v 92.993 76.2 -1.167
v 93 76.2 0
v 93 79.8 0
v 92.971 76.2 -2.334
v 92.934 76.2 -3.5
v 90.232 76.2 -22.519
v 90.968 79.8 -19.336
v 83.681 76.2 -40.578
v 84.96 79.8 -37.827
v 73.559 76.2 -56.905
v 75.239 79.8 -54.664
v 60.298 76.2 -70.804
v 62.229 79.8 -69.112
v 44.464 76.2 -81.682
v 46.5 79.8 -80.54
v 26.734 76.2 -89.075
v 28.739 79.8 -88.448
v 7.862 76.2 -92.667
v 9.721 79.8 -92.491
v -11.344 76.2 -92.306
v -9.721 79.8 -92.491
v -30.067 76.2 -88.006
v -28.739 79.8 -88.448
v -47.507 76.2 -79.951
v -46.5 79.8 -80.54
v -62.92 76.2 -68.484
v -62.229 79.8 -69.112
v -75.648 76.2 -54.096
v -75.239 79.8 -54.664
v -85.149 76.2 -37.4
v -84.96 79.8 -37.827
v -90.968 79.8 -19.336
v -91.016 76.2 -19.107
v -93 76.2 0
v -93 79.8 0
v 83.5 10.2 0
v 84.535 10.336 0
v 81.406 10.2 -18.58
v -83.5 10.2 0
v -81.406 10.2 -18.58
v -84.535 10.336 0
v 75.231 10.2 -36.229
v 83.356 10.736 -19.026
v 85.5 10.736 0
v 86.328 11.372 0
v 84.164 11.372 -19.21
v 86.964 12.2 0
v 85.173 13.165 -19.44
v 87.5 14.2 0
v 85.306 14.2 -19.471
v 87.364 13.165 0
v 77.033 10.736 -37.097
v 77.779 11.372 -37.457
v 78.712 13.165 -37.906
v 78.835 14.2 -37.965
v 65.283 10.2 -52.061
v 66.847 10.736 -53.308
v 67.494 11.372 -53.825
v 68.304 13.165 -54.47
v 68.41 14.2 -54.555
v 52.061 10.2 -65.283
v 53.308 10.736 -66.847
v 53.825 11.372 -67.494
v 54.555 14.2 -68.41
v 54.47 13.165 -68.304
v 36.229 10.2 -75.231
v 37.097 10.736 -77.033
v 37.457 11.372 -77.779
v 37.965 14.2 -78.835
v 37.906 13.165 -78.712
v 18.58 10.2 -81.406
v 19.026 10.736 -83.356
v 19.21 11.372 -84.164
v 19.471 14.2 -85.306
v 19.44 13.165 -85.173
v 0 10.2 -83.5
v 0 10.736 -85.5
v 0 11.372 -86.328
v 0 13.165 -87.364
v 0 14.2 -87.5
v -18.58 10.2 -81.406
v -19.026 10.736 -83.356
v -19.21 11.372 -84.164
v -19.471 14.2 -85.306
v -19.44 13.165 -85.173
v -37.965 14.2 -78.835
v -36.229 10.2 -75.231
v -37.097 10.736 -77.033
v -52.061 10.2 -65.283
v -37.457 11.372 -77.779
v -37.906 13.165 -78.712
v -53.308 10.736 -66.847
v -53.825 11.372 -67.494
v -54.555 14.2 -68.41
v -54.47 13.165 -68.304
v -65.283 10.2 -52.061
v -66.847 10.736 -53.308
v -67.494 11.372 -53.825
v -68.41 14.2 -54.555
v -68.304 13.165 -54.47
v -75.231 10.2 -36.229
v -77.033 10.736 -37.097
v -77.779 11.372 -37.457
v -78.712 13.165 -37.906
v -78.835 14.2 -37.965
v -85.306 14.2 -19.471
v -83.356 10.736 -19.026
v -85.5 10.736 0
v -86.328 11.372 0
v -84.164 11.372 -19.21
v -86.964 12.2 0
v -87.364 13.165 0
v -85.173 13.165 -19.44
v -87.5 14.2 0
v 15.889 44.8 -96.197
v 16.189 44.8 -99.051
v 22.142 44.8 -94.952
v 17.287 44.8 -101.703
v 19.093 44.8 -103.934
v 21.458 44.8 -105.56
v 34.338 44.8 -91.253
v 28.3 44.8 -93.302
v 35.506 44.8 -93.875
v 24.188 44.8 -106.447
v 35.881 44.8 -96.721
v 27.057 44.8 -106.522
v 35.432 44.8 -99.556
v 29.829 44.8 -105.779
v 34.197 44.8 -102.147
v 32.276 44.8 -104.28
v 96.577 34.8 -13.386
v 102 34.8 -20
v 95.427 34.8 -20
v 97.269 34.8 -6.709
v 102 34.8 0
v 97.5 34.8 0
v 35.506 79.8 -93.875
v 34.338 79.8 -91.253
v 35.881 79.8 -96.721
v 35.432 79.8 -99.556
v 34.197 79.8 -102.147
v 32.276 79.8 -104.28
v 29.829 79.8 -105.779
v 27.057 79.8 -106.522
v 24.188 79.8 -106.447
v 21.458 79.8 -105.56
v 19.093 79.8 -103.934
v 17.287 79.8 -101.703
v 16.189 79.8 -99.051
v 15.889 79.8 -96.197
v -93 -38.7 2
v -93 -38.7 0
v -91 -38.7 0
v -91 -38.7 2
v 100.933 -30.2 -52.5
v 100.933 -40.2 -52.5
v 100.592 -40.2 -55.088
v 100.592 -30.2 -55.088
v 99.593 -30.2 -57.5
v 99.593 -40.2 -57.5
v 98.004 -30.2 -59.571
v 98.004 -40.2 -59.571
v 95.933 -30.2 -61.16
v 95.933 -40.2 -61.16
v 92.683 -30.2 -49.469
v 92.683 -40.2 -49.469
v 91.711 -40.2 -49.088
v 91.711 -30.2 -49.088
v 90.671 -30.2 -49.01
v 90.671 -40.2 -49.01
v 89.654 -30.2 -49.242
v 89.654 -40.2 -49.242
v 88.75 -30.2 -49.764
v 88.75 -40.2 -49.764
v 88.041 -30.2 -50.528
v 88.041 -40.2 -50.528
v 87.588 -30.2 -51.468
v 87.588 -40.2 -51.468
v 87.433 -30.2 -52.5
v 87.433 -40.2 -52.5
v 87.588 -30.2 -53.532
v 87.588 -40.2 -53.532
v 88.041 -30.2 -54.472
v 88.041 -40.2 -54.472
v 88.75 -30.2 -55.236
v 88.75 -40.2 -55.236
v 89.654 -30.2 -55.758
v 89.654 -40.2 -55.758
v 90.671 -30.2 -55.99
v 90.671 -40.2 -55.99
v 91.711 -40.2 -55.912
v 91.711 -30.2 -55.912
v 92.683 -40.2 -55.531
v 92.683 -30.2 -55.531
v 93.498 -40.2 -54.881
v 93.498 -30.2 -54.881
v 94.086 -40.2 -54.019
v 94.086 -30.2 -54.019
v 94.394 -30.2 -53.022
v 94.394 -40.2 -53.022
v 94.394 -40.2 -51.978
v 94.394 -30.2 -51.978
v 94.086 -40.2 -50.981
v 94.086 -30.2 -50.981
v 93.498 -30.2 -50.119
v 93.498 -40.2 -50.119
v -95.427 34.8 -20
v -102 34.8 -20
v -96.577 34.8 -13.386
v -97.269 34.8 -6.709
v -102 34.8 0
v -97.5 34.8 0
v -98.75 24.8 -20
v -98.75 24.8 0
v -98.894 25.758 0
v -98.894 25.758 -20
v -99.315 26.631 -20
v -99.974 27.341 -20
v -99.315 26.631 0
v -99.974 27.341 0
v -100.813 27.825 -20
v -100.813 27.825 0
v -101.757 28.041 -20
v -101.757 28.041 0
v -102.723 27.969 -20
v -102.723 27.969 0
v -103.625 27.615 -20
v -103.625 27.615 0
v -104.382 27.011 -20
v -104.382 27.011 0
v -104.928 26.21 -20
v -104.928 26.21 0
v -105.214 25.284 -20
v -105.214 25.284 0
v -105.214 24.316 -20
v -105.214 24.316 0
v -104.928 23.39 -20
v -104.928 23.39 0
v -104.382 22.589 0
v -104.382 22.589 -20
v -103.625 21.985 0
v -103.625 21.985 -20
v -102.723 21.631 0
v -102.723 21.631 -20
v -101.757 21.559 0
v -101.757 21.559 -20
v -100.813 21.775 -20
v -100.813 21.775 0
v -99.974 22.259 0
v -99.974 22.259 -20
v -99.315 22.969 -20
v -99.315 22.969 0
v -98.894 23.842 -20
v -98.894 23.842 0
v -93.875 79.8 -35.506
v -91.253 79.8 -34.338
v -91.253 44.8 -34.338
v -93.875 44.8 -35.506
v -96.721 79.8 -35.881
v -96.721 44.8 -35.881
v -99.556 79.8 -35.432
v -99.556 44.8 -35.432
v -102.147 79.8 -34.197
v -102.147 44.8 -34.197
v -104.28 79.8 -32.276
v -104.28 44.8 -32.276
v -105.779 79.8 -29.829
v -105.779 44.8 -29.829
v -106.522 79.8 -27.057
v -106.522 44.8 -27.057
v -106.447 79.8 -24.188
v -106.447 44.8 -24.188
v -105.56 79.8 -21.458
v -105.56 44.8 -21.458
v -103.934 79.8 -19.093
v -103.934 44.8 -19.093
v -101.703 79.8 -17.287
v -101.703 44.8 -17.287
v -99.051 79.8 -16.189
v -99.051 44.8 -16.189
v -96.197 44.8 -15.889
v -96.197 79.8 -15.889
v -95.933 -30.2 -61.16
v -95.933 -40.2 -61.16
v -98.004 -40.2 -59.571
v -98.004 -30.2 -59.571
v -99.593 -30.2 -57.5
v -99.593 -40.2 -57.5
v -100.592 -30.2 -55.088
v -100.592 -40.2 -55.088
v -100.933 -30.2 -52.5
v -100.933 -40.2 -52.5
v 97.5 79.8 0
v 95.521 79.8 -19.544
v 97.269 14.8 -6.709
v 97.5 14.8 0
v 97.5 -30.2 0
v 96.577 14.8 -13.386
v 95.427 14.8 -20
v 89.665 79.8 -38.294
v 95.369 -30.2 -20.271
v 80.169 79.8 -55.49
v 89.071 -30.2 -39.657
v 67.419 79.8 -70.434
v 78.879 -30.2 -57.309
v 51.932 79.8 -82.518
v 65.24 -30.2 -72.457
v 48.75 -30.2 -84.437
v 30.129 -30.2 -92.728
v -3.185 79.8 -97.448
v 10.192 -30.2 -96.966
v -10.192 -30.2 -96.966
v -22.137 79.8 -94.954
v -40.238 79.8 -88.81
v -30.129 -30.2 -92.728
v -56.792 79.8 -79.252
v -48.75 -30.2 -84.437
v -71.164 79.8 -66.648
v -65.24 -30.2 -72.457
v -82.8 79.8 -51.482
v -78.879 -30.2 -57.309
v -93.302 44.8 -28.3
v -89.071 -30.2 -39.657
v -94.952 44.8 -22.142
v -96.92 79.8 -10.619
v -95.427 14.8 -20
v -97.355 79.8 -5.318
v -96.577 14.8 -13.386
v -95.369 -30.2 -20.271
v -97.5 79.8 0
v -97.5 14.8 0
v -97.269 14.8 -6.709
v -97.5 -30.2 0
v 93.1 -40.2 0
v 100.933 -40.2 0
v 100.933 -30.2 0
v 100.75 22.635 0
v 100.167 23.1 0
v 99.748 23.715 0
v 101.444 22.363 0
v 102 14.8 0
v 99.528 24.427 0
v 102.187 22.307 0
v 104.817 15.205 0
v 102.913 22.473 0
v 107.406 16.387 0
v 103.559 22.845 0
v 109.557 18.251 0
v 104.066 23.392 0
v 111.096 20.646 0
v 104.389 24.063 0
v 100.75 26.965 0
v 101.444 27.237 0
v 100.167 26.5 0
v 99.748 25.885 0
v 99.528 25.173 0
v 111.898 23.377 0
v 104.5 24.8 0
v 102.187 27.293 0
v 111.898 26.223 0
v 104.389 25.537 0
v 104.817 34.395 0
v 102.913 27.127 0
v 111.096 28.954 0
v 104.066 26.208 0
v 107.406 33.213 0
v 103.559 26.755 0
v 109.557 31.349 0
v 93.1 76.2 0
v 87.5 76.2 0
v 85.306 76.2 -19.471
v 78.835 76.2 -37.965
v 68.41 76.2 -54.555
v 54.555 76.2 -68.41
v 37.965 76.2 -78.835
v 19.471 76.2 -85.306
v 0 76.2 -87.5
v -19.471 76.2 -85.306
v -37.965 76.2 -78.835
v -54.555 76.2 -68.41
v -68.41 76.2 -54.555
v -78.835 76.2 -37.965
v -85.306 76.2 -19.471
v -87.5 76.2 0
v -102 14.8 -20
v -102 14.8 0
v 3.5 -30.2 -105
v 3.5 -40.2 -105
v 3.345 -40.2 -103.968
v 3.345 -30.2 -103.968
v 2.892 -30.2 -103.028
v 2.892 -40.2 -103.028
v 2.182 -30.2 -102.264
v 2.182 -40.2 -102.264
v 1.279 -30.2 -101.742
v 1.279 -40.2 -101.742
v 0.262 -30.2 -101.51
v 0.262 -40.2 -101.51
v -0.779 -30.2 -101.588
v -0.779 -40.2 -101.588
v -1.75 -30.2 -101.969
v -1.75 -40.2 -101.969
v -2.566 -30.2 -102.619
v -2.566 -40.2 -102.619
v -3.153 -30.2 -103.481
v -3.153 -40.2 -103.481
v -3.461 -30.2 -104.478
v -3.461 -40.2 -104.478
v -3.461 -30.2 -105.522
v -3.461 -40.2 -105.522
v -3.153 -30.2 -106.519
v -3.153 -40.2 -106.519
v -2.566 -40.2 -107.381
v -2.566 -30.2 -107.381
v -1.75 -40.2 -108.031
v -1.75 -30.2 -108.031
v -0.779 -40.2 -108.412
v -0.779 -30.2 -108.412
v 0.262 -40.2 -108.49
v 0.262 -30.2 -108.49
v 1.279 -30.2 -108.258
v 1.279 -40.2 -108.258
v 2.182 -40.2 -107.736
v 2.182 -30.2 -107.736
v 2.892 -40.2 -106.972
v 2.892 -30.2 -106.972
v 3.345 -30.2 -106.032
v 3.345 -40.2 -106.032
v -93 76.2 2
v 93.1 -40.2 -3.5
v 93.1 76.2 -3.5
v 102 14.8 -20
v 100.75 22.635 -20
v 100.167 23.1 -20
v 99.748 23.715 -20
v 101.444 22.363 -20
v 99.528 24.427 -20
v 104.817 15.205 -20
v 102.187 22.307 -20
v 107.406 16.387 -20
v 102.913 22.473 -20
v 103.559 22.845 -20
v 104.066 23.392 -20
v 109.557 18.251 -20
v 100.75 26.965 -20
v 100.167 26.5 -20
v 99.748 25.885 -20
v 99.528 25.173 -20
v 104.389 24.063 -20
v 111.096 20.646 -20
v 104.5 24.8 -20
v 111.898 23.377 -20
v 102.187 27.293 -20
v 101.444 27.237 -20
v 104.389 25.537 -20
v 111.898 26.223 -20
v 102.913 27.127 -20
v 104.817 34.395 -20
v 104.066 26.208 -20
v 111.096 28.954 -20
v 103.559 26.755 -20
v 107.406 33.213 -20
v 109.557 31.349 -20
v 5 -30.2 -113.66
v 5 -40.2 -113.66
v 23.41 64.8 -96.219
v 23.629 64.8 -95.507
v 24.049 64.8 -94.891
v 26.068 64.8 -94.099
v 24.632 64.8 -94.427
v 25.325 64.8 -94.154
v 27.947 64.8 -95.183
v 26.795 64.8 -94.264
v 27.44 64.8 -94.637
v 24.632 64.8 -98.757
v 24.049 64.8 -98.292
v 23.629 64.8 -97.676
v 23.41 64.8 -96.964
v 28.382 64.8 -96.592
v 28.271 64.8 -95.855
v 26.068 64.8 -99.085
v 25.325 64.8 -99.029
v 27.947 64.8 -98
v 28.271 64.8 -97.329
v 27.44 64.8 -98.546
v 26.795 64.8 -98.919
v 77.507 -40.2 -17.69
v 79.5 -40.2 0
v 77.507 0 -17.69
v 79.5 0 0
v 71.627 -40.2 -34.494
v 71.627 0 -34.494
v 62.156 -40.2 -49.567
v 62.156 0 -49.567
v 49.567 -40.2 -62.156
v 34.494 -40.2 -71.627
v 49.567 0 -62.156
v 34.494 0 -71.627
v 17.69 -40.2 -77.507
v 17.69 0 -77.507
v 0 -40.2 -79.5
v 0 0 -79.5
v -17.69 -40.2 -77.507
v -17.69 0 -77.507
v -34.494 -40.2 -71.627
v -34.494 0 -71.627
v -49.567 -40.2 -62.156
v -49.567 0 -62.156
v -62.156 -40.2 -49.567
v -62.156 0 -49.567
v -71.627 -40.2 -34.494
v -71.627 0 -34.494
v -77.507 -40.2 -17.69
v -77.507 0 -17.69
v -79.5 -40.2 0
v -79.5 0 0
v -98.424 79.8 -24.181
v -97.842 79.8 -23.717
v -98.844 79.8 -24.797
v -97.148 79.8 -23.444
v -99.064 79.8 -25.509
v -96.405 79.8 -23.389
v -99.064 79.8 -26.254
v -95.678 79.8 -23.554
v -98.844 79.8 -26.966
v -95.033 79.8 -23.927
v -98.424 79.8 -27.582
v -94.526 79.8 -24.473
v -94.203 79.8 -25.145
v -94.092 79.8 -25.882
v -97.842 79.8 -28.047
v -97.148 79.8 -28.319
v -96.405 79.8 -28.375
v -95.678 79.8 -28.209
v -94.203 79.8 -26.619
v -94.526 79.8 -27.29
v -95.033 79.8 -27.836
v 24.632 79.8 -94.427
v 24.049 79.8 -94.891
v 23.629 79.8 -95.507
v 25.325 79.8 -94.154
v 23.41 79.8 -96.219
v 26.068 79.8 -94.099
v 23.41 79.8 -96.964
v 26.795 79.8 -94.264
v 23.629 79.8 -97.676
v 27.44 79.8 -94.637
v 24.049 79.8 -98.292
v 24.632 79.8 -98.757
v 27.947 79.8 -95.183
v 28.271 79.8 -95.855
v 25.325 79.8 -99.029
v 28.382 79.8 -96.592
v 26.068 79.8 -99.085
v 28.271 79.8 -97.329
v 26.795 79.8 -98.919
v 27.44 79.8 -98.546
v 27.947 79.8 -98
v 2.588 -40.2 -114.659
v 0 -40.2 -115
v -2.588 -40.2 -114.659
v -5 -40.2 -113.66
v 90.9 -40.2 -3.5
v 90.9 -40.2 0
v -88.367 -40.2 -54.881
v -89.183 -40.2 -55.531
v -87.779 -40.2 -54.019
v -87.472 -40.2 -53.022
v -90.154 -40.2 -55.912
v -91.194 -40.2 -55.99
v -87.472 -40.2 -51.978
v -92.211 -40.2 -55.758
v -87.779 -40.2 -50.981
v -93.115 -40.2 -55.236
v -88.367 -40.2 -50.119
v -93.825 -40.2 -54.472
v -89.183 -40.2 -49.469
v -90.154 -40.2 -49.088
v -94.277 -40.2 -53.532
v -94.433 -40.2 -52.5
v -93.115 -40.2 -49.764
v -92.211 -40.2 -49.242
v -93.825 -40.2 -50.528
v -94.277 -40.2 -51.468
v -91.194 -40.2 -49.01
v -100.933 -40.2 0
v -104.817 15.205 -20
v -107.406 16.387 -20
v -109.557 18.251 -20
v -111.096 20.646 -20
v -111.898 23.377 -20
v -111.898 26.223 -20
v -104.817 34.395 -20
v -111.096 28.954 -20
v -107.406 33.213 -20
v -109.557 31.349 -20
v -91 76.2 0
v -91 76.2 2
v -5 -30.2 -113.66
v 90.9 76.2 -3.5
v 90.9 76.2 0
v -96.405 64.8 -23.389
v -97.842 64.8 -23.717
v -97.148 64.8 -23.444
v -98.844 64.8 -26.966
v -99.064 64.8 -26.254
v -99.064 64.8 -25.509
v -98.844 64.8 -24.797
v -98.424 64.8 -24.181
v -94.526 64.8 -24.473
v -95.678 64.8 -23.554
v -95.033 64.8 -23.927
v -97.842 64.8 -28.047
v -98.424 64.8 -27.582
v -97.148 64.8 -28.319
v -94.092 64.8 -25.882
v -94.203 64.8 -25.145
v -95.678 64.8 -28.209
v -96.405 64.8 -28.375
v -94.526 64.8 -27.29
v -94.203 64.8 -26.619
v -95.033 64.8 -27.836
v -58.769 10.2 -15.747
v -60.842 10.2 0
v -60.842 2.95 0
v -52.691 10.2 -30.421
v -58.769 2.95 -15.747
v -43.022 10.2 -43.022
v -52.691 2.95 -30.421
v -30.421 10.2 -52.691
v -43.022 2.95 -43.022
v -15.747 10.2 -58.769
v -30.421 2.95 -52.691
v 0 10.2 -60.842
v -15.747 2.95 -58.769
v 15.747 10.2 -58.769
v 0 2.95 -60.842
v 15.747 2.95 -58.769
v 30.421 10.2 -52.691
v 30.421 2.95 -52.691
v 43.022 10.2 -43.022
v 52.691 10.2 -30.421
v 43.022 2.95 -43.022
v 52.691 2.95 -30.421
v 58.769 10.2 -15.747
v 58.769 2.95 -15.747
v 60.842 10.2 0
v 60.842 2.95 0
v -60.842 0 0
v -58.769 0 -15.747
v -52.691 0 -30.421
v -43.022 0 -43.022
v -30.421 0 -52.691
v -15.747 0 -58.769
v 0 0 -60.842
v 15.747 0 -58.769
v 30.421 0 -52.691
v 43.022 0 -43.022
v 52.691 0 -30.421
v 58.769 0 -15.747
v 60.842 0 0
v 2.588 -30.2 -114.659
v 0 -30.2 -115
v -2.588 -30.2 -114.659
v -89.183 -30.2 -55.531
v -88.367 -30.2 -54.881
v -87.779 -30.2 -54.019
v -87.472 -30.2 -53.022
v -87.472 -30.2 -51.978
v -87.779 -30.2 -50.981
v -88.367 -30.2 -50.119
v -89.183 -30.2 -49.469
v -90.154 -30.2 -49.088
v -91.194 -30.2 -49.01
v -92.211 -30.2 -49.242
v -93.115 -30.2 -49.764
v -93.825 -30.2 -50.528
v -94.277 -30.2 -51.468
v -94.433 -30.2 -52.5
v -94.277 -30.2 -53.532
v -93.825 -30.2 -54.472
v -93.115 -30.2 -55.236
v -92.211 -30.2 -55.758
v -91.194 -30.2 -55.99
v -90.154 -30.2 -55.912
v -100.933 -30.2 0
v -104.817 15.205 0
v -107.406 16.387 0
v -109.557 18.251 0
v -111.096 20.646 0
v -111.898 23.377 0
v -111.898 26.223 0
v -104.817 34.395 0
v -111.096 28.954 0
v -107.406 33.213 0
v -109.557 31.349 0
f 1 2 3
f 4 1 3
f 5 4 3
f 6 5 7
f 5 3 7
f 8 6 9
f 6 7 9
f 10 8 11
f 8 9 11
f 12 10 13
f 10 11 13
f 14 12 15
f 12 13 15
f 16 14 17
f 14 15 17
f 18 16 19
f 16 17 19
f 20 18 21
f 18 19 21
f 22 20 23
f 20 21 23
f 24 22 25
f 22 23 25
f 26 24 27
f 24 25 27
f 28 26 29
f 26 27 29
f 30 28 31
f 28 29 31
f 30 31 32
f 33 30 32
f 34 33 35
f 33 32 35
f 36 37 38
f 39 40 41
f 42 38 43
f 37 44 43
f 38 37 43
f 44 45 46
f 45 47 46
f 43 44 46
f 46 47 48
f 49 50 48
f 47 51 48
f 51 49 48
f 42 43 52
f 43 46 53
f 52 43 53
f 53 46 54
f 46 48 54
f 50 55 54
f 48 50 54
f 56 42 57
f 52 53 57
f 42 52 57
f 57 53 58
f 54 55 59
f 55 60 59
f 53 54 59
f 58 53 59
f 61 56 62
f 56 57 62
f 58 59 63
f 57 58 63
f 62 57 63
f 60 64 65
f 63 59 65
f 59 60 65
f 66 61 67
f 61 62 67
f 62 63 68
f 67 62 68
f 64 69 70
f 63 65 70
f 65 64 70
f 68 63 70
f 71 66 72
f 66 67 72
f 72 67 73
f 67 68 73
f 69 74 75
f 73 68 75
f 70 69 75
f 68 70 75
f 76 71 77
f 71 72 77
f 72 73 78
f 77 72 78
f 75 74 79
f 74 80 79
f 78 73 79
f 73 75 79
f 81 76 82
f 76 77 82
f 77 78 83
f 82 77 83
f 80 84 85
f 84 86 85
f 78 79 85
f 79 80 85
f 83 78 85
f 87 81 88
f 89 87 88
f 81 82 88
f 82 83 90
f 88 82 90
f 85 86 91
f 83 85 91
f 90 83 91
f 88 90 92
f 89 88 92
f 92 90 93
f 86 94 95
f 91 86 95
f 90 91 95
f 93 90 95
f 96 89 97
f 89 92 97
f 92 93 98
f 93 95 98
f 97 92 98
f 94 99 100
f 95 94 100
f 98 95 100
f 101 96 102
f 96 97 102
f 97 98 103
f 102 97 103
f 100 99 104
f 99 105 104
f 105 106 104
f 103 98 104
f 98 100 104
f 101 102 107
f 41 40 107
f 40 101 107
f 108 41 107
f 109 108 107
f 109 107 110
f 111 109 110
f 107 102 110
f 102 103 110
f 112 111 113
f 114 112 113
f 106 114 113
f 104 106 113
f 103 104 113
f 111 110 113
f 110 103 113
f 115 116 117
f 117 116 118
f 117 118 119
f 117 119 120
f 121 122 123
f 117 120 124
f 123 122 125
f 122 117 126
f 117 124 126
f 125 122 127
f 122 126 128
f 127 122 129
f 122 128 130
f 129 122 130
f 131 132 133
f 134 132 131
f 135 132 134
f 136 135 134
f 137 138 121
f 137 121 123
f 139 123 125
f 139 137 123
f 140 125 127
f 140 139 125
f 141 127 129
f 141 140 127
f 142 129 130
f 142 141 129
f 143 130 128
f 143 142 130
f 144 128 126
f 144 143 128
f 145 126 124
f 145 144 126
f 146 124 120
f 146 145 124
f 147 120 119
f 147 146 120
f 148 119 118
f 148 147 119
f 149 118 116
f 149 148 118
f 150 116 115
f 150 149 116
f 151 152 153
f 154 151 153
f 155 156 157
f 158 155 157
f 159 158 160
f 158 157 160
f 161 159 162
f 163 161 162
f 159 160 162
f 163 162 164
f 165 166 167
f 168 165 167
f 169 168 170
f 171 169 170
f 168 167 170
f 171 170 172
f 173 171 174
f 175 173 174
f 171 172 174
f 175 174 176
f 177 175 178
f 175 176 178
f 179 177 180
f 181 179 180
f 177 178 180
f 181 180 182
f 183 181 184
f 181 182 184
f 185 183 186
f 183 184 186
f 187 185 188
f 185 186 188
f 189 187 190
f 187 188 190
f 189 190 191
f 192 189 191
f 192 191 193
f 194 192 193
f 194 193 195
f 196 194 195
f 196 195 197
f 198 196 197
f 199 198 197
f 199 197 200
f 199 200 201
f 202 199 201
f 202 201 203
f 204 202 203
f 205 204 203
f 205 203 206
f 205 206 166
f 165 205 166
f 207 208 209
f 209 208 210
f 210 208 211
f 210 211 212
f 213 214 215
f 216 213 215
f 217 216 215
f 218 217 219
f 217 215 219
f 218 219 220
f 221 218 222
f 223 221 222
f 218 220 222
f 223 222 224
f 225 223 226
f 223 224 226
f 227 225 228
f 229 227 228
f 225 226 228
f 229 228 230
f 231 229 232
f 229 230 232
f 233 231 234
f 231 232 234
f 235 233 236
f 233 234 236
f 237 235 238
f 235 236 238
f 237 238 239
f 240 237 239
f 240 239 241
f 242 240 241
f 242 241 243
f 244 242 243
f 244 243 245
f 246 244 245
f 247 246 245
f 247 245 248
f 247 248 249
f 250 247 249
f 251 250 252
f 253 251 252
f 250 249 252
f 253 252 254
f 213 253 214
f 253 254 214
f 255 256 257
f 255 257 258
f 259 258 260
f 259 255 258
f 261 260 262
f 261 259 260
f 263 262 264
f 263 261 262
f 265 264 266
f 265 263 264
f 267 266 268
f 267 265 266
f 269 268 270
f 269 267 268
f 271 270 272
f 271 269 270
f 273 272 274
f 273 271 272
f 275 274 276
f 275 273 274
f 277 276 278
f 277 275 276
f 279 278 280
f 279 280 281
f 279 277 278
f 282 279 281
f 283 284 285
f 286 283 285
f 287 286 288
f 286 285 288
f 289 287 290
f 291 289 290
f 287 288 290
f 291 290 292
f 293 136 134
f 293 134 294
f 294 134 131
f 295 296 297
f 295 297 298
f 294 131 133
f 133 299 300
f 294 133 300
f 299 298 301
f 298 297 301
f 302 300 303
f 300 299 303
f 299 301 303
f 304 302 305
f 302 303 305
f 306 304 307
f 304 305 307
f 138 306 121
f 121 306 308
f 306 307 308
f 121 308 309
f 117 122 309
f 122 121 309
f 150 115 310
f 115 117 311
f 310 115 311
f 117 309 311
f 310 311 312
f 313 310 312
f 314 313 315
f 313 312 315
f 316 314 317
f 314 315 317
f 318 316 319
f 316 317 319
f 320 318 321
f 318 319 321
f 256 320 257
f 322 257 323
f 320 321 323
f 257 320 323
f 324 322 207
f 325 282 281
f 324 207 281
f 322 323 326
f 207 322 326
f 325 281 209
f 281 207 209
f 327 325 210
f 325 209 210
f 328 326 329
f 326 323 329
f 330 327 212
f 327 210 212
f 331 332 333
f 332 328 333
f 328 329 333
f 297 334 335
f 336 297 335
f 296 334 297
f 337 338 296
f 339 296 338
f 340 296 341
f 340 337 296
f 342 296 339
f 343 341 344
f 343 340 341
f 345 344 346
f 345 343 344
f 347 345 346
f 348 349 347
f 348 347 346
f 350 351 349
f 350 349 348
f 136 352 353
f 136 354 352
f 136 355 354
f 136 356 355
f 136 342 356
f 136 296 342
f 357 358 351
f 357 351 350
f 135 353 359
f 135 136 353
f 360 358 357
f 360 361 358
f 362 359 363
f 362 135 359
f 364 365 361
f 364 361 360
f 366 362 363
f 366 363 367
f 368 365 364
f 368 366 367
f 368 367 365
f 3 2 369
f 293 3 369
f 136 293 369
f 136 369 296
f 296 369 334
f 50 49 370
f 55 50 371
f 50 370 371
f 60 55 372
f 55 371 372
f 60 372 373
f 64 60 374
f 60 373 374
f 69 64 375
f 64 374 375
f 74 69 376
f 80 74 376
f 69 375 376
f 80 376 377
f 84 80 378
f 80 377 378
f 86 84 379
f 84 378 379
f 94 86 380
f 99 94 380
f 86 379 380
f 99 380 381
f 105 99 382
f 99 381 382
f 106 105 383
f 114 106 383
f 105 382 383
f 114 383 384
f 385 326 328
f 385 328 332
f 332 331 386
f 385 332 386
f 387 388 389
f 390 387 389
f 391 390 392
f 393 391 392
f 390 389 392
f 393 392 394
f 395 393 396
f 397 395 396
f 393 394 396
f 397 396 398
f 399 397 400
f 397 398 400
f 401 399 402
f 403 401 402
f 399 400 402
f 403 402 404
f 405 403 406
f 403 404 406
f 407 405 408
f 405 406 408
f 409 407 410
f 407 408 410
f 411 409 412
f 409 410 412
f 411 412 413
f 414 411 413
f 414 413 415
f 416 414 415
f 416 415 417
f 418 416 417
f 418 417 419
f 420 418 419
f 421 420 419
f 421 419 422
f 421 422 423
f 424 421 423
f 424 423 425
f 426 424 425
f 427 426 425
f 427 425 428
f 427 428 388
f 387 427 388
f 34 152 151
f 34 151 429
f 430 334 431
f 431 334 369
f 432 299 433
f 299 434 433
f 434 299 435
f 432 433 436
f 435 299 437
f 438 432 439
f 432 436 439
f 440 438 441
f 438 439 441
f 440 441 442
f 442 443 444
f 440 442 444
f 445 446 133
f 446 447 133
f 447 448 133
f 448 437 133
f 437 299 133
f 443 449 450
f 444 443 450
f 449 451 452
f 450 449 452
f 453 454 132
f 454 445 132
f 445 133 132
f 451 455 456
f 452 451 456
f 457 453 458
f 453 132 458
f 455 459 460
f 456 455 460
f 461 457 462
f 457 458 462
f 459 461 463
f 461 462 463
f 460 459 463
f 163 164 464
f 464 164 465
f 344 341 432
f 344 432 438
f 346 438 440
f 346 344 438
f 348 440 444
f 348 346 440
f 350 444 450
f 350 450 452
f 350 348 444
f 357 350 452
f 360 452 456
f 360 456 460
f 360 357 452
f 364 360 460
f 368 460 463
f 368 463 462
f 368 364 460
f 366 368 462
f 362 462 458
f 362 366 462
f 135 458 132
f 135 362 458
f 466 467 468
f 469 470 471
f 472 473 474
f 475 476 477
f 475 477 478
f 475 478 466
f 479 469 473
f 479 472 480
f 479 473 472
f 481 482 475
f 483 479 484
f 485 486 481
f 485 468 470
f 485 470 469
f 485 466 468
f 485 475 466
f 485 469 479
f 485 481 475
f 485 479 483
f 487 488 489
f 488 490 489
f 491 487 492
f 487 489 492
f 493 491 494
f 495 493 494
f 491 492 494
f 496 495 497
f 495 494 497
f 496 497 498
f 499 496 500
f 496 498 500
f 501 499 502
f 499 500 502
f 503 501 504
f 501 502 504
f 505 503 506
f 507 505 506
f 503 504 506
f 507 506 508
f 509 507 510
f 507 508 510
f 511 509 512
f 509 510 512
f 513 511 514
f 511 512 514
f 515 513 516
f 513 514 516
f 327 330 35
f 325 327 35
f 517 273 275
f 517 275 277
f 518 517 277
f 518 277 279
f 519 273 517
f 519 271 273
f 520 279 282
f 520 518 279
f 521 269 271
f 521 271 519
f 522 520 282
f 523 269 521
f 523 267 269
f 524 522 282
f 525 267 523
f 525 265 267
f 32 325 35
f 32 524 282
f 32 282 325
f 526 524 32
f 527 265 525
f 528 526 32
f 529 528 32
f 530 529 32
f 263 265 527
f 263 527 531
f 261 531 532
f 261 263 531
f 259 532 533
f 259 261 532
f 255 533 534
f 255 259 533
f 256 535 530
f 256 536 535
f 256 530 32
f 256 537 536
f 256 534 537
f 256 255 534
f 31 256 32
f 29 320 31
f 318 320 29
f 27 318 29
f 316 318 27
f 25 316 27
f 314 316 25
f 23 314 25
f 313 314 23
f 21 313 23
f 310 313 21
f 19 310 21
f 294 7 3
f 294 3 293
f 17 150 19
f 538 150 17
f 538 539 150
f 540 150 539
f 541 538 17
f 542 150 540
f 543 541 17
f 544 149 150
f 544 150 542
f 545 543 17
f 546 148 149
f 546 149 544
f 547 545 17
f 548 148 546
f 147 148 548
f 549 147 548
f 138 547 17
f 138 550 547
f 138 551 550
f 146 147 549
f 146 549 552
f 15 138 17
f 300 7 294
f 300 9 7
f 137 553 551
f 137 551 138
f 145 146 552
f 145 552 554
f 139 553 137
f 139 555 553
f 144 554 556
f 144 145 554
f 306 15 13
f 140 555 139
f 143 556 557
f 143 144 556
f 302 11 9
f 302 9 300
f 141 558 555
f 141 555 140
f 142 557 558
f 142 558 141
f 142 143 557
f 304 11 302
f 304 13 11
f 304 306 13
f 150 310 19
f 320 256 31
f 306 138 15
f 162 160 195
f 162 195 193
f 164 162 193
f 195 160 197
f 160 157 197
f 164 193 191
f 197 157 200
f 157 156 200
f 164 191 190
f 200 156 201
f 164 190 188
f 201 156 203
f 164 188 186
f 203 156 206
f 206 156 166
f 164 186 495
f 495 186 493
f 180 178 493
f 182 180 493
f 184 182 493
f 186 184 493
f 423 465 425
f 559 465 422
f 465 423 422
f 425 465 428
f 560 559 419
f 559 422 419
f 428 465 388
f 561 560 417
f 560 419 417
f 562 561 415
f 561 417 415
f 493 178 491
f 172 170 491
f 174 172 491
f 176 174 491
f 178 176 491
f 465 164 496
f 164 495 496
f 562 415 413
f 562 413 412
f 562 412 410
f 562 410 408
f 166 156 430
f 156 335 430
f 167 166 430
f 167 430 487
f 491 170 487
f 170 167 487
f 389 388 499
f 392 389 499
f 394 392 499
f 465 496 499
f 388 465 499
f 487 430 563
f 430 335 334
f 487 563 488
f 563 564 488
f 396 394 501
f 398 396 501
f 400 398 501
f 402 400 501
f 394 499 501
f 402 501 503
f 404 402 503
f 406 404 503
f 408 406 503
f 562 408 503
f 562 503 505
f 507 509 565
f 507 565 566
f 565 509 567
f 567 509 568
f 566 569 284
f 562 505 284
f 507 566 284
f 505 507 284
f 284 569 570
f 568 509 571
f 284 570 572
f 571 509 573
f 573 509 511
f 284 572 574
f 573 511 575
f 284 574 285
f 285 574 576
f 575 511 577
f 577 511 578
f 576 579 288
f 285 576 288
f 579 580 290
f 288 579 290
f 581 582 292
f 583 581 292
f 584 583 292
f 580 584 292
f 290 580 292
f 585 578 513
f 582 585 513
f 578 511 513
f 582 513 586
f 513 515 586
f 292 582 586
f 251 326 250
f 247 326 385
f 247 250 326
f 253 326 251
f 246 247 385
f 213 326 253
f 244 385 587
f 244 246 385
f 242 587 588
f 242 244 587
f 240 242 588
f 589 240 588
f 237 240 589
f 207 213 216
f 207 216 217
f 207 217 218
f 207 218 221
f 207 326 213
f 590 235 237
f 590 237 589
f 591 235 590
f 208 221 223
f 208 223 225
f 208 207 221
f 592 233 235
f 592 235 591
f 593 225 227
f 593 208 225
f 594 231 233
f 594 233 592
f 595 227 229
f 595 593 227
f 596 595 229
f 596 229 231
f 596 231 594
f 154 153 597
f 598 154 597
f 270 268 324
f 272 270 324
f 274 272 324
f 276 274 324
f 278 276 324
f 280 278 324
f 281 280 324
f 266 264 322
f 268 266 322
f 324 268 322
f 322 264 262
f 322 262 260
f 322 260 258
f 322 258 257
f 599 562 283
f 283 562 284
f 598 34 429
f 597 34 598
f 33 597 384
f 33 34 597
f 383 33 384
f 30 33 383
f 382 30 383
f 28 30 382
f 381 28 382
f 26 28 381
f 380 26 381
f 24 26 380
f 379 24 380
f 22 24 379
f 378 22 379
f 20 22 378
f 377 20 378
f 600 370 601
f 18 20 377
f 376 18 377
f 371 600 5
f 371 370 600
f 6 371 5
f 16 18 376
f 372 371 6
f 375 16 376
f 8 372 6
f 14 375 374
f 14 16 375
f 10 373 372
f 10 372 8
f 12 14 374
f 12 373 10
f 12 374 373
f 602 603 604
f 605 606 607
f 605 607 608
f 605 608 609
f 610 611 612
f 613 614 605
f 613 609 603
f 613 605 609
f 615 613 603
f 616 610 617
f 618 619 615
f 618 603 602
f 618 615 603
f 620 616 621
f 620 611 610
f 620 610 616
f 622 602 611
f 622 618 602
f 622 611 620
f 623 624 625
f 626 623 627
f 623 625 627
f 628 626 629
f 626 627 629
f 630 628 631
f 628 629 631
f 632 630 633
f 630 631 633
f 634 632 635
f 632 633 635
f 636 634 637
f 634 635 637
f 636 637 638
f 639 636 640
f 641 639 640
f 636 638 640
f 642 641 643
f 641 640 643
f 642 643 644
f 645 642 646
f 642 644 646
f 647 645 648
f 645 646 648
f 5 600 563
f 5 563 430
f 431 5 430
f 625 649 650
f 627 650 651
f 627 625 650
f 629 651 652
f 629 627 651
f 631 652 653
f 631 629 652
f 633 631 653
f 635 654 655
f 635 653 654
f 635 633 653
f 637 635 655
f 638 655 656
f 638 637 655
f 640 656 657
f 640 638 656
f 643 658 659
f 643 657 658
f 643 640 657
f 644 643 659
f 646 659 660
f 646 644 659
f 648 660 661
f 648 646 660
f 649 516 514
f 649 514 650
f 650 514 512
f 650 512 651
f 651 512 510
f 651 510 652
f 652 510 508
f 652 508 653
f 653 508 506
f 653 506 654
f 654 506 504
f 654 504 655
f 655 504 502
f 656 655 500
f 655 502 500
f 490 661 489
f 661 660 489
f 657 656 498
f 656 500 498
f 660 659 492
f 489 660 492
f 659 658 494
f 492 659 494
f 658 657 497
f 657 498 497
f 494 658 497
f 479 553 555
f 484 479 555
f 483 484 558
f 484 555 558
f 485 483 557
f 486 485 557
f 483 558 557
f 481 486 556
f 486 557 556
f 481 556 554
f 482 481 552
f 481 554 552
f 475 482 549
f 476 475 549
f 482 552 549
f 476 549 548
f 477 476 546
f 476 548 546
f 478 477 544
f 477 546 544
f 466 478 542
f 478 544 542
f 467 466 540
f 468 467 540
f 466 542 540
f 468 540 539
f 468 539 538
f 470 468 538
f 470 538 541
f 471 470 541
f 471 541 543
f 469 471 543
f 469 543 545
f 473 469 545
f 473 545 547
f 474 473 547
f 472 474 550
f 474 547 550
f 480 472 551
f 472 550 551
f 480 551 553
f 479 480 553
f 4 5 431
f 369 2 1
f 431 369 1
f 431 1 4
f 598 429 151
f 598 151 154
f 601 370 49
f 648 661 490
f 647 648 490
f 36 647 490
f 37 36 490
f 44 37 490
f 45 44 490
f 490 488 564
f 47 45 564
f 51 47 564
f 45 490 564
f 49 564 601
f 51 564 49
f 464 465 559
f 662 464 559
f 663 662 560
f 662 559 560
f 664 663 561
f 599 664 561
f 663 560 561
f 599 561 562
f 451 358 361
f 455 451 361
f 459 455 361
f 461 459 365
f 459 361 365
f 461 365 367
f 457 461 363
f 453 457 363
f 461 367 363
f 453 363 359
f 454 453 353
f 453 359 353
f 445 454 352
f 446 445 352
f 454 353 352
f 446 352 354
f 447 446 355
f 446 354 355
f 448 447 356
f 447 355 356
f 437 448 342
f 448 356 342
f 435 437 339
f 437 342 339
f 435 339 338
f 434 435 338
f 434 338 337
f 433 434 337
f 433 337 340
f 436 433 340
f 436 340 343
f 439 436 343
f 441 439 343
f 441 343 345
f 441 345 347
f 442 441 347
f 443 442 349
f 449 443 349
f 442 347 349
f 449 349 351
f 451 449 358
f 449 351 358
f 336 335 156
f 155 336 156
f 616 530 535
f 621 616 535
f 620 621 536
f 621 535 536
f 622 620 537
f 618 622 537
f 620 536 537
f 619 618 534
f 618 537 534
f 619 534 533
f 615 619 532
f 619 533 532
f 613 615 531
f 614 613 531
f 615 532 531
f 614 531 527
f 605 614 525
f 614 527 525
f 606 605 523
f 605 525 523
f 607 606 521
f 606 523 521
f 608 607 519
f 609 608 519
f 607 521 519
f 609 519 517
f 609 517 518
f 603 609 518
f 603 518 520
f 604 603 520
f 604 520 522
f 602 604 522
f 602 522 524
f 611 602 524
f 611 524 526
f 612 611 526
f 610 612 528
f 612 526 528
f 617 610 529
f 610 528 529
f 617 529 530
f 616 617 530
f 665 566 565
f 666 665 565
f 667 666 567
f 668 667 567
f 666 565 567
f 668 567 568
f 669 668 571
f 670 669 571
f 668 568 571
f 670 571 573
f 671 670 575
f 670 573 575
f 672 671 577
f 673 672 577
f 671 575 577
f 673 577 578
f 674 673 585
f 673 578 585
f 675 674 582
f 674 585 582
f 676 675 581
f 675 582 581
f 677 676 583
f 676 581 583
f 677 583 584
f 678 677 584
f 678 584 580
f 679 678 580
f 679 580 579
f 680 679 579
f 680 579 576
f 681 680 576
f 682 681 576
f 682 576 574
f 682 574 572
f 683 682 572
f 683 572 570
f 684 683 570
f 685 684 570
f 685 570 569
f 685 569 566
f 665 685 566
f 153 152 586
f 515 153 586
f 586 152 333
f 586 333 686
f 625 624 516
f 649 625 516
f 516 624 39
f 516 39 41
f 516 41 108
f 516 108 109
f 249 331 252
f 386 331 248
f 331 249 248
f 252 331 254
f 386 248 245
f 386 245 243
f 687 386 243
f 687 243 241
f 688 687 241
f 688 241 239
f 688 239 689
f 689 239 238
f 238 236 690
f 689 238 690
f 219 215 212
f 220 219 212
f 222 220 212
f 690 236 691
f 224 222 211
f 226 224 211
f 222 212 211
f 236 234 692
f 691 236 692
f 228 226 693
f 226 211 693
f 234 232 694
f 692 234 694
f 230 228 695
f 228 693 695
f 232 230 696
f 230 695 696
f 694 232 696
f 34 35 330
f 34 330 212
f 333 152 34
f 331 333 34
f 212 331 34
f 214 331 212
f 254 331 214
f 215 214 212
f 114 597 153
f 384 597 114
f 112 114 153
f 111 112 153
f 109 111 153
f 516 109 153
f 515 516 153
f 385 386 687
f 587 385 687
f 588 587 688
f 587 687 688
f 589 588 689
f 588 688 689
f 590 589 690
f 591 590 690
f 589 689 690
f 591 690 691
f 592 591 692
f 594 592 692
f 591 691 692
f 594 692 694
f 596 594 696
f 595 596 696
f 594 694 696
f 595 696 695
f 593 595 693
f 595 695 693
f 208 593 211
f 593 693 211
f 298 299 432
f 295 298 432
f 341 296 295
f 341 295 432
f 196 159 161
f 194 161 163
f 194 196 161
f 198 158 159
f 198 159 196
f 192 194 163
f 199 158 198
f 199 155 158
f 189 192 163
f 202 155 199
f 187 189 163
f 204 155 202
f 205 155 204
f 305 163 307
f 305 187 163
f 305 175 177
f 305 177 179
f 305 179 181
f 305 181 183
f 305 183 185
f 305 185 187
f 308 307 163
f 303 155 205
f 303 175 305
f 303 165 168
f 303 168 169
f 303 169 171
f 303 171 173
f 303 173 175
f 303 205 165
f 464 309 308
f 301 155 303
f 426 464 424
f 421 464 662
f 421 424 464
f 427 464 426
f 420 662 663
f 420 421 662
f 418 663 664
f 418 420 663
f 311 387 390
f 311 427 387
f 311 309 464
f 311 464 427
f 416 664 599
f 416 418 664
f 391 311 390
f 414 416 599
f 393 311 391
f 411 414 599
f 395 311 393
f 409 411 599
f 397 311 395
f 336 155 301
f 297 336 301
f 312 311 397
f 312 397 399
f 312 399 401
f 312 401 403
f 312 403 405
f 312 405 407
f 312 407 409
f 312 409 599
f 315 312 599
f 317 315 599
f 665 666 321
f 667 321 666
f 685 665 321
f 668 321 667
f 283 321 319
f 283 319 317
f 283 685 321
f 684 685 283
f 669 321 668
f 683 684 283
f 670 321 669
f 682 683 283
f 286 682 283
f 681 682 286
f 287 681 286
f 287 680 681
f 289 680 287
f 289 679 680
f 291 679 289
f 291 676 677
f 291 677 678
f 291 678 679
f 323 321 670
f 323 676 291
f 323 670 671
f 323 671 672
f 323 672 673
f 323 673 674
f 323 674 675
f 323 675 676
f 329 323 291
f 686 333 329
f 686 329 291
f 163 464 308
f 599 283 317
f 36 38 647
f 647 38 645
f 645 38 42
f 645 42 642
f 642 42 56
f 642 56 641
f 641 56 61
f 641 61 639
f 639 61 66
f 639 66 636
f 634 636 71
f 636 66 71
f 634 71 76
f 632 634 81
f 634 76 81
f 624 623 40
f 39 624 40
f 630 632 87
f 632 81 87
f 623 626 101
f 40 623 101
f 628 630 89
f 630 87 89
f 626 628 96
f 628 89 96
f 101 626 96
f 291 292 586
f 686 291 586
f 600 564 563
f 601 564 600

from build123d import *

# Parameters (mm, degrees)
REVOLU_O2_ANGLE             = 180
ESBO_O4_R                   = 10
RESSALTO_EXTRUS_O1_DEPTH    = 35
RESSALTO_EXTRUS_O10_DEPTH   = 10
ESBO_O8_R                   = 3.5
CORTE_EXTRUS_O2_DEPTH       = 20
PADR_OCIRCULAR1_COUNT       = 6
ESBO_O6_R                   = 2.5
CORTE_EXTRUS_O1_DEPTH       = 15
ESBO_O9_R                   = 1.25
CORTE_EXTRUS_O3_DEPTH       = 6
ESBO_O10_W                  = 2.2
ESBO_O10_H                  = 116.4
CORTE_EXTRUS_O4_DEPTH       = 3.5
ESBO_O11_W                  = 2
ESBO_O11_H                  = 114.9
RESSALTO_EXTRUS_O5_DEPTH    = 2
ESBO_O12_R                  = 3.25
RESSALTO_EXTRUS_O6_DEPTH    = 20
ESBO_O13_R                  = 2.5
RESSALTO_EXTRUS_O7_DEPTH    = 20
ESBO_O16_R                  = 93
CORTE_EXTRUS_O6_DEPTH       = 10
ESBO_O25_R                  = 60.842408243
CORTE_EXTRUS_O10_DEPTH      = 44.15
CORTE_EXTRUS_O10_DEPTH_BACK = 77.85


with BuildPart() as part:
    # Esbo_o3 → Revolu_o2 (revolve)
    with BuildSketch(Plane.XY):
        with BuildLine():
            Line((97.5, 79.8), (97.5, 11.304491341))
            Line((97.5, 11.304491341), (97.5, 0))
            Line((97.5, 0), (97.5, -40.2))
            Line((97.5, -40.2), (79.5, -40.2))
            Line((79.5, -40.2), (79.5, 0))
            Line((79.5, 0), (60.342408243, 0))
            Line((60.342408243, 0), (60.342408243, 2.95))
            Line((60.342408243, 2.95), (52, 2.95))
            Line((52, 2.95), (44, 10.95))
            Line((44, 10.95), (31, 10.95))
            Line((31, 10.95), (31, 13.7))
            Line((31, 13.7), (22.6, 13.7))
            Line((22.6, 13.7), (22.6, 17))
            Line((22.6, 17), (19.3, 17))
            Line((19.3, 17), (19.3, 17.7))
            Line((19.3, 17.7), (15.3, 17.7))
            Line((15.3, 17.7), (15.3, 21.05))
            Line((15.3, 21.05), (19.3, 21.05))
            Line((19.3, 21.05), (19.3, 21.2))
            Line((19.3, 21.2), (27.626549127, 25.96))
            Line((27.626549127, 25.96), (31.3, 25.96))
            Line((31.3, 25.96), (31.3, 43.96))
            Line((31.3, 43.96), (32.3, 44.96))
            Line((32.3, 44.96), (38.8, 44.96))
            Line((38.8, 44.96), (38.8, 26.9))
            Line((38.8, 26.9), (55.5, 10.2))
            Line((55.5, 10.2), (83.5, 10.2))
            ThreePointArc((83.5, 10.2), (86.328427125, 11.371572875), (87.5, 14.2))
            Line((87.5, 14.2), (87.5, 76.2))
            Line((87.5, 76.2), (93, 76.2))
            Line((93, 76.2), (93, 79.8))
            Line((93, 79.8), (97.5, 79.8))
        make_face()
    revolve(axis=Axis((0, -3.322055656, 0), (0, 1, 0)), revolution_arc=REVOLU_O2_ANGLE)

    # Esbo_o4 → Ressalto-extrus_o1 (add)
    with BuildSketch(Plane(origin=(0, 79.8, 0), x_dir=(1, 0, 0), z_dir=(0, 1, 0))):
        with Locations((25.881656302, 96.591656302)):
            Circle(ESBO_O4_R)
        with Locations((-96.591656302, 25.881656302)):
            Circle(ESBO_O4_R)
    extrude(amount=-RESSALTO_EXTRUS_O1_DEPTH)

    # Esbo_o23 → Ressalto-extrus_o10 (add)
    with BuildSketch(Plane.XZ.offset(40.2)):
        with BuildLine():
            Line((95.932667397, -61.160254038), (5, -113.660254038))
            ThreePointArc((5, -113.660254038), (0, -115), (-5, -113.660254038))
            Line((-5, -113.660254038), (-95.932667397, -61.160254038))
            ThreePointArc((-95.932667397, -61.160254038), (-99.592921435, -57.5), (-100.932667397, -52.5))
            Line((-100.932667397, -52.5), (-100.932667397, 0))
            Line((-100.932667397, 0), (-96.380584002, 0))
            ThreePointArc((-96.380584002, 0), (0, -96.380584002), (96.380584002, 0))
            Line((96.380584002, 0), (100.932667397, 0))
            Line((100.932667397, 0), (100.932667397, -52.5))
            ThreePointArc((100.932667397, -52.5), (99.592921435, -57.5), (95.932667397, -61.160254038))
        make_face()
    extrude(amount=-RESSALTO_EXTRUS_O10_DEPTH)

    # Esbo_o8 → Corte-extrus_o2 (cut)
    with BuildSketch(Plane.XZ.offset(40.2)):
        with Locations((0, -105)):
            Circle(ESBO_O8_R)
    corte_extrus_o2 = extrude(amount=-CORTE_EXTRUS_O2_DEPTH, mode=Mode.SUBTRACT)

    # Padr_oCircular1: Corte-extrus_o2 ×6 about axis
    padr_ocircular1_axis = Axis((0, 0, 0), (0, 1, 0))
    for i in range(1, PADR_OCIRCULAR1_COUNT):
        add(corte_extrus_o2.rotate(padr_ocircular1_axis, i * 360 / PADR_OCIRCULAR1_COUNT), mode=Mode.SUBTRACT)

    # Esbo_o6 → Corte-extrus_o1 (cut)
    with BuildSketch(Plane(origin=(0, 79.8, 0), x_dir=(1, 0, 0), z_dir=(0, 1, 0))):
        with Locations((25.881656302, 96.591656302)):
            Circle(ESBO_O6_R)
        with Locations((-96.591656302, 25.881656302)):
            Circle(ESBO_O6_R)
    extrude(amount=-CORTE_EXTRUS_O1_DEPTH, mode=Mode.SUBTRACT)

    # Esbo_o9 → Corte-extrus_o3 (cut)
    with BuildSketch(Plane.XZ.offset(-13.7)):
        with Locations((18.738329701, -18.738329701)):
            Circle(ESBO_O9_R)
        with Locations((-18.738329701, -18.738329701)):
            Circle(ESBO_O9_R)
        with Locations((-18.738329701, 18.738329701)):
            Circle(ESBO_O9_R)
        with Locations((18.738329701, 18.738329701)):
            Circle(ESBO_O9_R)
    extrude(amount=-CORTE_EXTRUS_O3_DEPTH, mode=Mode.SUBTRACT)

    # Esbo_o10 → Corte-extrus_o4 (cut)
    with BuildSketch(Plane.XY):
        with Locations((92, 18)):
            Rectangle(ESBO_O10_W, ESBO_O10_H)
    extrude(amount=-CORTE_EXTRUS_O4_DEPTH, mode=Mode.SUBTRACT)

    # Esbo_o11 → Ressalto-extrus_o5 (add)
    with BuildSketch(Plane.XY):
        with Locations((-92, 18.75)):
            Rectangle(ESBO_O11_W, ESBO_O11_H)
    extrude(amount=RESSALTO_EXTRUS_O5_DEPTH)

    # Esbo_o12 → Ressalto-extrus_o6 (add)
    with BuildSketch(Plane.XY):
        with BuildLine():
            Line((-102, 34.8), (-87.5, 34.8))
            Line((-87.5, 34.8), (-87.5, 14.8))
            Line((-87.5, 14.8), (-102, 14.8))
            ThreePointArc((-102, 14.8), (-112, 24.8), (-102, 34.8))
        make_face()
        with Locations((-102, 24.8)):
            Circle(ESBO_O12_R, mode=Mode.SUBTRACT)
    extrude(amount=-RESSALTO_EXTRUS_O6_DEPTH)

    # Esbo_o13 → Ressalto-extrus_o7 (add)
    with BuildSketch(Plane.XY):
        with BuildLine():
            Line((102, 34.8), (93.1, 34.8))
            Line((93.1, 34.8), (93.1, 14.8))
            Line((93.1, 14.8), (102, 14.8))
            ThreePointArc((102, 14.8), (112, 24.8), (102, 34.8))
        make_face()
        with Locations((102, 24.8)):
            Circle(ESBO_O13_R, mode=Mode.SUBTRACT)
    extrude(amount=-RESSALTO_EXTRUS_O7_DEPTH)

    # Esbo_o16 → Corte-extrus_o6 (cut)
    with BuildSketch(Plane(origin=(0, 76.2, 0), x_dir=(1, 0, 0), z_dir=(0, 1, 0))):
        Circle(ESBO_O16_R)
    extrude(amount=CORTE_EXTRUS_O6_DEPTH, mode=Mode.SUBTRACT)

    # Esbo_o25 → Corte-extrus_o10 (cut, two sides)
    with BuildSketch(Plane.XZ.offset(-2.95)) as corte_extrus_o10_sk:
        Circle(ESBO_O25_R)
    extrude(amount=CORTE_EXTRUS_O10_DEPTH, mode=Mode.SUBTRACT)
    extrude(corte_extrus_o10_sk.sketch, amount=-CORTE_EXTRUS_O10_DEPTH_BACK, mode=Mode.SUBTRACT)


solid = part.part
